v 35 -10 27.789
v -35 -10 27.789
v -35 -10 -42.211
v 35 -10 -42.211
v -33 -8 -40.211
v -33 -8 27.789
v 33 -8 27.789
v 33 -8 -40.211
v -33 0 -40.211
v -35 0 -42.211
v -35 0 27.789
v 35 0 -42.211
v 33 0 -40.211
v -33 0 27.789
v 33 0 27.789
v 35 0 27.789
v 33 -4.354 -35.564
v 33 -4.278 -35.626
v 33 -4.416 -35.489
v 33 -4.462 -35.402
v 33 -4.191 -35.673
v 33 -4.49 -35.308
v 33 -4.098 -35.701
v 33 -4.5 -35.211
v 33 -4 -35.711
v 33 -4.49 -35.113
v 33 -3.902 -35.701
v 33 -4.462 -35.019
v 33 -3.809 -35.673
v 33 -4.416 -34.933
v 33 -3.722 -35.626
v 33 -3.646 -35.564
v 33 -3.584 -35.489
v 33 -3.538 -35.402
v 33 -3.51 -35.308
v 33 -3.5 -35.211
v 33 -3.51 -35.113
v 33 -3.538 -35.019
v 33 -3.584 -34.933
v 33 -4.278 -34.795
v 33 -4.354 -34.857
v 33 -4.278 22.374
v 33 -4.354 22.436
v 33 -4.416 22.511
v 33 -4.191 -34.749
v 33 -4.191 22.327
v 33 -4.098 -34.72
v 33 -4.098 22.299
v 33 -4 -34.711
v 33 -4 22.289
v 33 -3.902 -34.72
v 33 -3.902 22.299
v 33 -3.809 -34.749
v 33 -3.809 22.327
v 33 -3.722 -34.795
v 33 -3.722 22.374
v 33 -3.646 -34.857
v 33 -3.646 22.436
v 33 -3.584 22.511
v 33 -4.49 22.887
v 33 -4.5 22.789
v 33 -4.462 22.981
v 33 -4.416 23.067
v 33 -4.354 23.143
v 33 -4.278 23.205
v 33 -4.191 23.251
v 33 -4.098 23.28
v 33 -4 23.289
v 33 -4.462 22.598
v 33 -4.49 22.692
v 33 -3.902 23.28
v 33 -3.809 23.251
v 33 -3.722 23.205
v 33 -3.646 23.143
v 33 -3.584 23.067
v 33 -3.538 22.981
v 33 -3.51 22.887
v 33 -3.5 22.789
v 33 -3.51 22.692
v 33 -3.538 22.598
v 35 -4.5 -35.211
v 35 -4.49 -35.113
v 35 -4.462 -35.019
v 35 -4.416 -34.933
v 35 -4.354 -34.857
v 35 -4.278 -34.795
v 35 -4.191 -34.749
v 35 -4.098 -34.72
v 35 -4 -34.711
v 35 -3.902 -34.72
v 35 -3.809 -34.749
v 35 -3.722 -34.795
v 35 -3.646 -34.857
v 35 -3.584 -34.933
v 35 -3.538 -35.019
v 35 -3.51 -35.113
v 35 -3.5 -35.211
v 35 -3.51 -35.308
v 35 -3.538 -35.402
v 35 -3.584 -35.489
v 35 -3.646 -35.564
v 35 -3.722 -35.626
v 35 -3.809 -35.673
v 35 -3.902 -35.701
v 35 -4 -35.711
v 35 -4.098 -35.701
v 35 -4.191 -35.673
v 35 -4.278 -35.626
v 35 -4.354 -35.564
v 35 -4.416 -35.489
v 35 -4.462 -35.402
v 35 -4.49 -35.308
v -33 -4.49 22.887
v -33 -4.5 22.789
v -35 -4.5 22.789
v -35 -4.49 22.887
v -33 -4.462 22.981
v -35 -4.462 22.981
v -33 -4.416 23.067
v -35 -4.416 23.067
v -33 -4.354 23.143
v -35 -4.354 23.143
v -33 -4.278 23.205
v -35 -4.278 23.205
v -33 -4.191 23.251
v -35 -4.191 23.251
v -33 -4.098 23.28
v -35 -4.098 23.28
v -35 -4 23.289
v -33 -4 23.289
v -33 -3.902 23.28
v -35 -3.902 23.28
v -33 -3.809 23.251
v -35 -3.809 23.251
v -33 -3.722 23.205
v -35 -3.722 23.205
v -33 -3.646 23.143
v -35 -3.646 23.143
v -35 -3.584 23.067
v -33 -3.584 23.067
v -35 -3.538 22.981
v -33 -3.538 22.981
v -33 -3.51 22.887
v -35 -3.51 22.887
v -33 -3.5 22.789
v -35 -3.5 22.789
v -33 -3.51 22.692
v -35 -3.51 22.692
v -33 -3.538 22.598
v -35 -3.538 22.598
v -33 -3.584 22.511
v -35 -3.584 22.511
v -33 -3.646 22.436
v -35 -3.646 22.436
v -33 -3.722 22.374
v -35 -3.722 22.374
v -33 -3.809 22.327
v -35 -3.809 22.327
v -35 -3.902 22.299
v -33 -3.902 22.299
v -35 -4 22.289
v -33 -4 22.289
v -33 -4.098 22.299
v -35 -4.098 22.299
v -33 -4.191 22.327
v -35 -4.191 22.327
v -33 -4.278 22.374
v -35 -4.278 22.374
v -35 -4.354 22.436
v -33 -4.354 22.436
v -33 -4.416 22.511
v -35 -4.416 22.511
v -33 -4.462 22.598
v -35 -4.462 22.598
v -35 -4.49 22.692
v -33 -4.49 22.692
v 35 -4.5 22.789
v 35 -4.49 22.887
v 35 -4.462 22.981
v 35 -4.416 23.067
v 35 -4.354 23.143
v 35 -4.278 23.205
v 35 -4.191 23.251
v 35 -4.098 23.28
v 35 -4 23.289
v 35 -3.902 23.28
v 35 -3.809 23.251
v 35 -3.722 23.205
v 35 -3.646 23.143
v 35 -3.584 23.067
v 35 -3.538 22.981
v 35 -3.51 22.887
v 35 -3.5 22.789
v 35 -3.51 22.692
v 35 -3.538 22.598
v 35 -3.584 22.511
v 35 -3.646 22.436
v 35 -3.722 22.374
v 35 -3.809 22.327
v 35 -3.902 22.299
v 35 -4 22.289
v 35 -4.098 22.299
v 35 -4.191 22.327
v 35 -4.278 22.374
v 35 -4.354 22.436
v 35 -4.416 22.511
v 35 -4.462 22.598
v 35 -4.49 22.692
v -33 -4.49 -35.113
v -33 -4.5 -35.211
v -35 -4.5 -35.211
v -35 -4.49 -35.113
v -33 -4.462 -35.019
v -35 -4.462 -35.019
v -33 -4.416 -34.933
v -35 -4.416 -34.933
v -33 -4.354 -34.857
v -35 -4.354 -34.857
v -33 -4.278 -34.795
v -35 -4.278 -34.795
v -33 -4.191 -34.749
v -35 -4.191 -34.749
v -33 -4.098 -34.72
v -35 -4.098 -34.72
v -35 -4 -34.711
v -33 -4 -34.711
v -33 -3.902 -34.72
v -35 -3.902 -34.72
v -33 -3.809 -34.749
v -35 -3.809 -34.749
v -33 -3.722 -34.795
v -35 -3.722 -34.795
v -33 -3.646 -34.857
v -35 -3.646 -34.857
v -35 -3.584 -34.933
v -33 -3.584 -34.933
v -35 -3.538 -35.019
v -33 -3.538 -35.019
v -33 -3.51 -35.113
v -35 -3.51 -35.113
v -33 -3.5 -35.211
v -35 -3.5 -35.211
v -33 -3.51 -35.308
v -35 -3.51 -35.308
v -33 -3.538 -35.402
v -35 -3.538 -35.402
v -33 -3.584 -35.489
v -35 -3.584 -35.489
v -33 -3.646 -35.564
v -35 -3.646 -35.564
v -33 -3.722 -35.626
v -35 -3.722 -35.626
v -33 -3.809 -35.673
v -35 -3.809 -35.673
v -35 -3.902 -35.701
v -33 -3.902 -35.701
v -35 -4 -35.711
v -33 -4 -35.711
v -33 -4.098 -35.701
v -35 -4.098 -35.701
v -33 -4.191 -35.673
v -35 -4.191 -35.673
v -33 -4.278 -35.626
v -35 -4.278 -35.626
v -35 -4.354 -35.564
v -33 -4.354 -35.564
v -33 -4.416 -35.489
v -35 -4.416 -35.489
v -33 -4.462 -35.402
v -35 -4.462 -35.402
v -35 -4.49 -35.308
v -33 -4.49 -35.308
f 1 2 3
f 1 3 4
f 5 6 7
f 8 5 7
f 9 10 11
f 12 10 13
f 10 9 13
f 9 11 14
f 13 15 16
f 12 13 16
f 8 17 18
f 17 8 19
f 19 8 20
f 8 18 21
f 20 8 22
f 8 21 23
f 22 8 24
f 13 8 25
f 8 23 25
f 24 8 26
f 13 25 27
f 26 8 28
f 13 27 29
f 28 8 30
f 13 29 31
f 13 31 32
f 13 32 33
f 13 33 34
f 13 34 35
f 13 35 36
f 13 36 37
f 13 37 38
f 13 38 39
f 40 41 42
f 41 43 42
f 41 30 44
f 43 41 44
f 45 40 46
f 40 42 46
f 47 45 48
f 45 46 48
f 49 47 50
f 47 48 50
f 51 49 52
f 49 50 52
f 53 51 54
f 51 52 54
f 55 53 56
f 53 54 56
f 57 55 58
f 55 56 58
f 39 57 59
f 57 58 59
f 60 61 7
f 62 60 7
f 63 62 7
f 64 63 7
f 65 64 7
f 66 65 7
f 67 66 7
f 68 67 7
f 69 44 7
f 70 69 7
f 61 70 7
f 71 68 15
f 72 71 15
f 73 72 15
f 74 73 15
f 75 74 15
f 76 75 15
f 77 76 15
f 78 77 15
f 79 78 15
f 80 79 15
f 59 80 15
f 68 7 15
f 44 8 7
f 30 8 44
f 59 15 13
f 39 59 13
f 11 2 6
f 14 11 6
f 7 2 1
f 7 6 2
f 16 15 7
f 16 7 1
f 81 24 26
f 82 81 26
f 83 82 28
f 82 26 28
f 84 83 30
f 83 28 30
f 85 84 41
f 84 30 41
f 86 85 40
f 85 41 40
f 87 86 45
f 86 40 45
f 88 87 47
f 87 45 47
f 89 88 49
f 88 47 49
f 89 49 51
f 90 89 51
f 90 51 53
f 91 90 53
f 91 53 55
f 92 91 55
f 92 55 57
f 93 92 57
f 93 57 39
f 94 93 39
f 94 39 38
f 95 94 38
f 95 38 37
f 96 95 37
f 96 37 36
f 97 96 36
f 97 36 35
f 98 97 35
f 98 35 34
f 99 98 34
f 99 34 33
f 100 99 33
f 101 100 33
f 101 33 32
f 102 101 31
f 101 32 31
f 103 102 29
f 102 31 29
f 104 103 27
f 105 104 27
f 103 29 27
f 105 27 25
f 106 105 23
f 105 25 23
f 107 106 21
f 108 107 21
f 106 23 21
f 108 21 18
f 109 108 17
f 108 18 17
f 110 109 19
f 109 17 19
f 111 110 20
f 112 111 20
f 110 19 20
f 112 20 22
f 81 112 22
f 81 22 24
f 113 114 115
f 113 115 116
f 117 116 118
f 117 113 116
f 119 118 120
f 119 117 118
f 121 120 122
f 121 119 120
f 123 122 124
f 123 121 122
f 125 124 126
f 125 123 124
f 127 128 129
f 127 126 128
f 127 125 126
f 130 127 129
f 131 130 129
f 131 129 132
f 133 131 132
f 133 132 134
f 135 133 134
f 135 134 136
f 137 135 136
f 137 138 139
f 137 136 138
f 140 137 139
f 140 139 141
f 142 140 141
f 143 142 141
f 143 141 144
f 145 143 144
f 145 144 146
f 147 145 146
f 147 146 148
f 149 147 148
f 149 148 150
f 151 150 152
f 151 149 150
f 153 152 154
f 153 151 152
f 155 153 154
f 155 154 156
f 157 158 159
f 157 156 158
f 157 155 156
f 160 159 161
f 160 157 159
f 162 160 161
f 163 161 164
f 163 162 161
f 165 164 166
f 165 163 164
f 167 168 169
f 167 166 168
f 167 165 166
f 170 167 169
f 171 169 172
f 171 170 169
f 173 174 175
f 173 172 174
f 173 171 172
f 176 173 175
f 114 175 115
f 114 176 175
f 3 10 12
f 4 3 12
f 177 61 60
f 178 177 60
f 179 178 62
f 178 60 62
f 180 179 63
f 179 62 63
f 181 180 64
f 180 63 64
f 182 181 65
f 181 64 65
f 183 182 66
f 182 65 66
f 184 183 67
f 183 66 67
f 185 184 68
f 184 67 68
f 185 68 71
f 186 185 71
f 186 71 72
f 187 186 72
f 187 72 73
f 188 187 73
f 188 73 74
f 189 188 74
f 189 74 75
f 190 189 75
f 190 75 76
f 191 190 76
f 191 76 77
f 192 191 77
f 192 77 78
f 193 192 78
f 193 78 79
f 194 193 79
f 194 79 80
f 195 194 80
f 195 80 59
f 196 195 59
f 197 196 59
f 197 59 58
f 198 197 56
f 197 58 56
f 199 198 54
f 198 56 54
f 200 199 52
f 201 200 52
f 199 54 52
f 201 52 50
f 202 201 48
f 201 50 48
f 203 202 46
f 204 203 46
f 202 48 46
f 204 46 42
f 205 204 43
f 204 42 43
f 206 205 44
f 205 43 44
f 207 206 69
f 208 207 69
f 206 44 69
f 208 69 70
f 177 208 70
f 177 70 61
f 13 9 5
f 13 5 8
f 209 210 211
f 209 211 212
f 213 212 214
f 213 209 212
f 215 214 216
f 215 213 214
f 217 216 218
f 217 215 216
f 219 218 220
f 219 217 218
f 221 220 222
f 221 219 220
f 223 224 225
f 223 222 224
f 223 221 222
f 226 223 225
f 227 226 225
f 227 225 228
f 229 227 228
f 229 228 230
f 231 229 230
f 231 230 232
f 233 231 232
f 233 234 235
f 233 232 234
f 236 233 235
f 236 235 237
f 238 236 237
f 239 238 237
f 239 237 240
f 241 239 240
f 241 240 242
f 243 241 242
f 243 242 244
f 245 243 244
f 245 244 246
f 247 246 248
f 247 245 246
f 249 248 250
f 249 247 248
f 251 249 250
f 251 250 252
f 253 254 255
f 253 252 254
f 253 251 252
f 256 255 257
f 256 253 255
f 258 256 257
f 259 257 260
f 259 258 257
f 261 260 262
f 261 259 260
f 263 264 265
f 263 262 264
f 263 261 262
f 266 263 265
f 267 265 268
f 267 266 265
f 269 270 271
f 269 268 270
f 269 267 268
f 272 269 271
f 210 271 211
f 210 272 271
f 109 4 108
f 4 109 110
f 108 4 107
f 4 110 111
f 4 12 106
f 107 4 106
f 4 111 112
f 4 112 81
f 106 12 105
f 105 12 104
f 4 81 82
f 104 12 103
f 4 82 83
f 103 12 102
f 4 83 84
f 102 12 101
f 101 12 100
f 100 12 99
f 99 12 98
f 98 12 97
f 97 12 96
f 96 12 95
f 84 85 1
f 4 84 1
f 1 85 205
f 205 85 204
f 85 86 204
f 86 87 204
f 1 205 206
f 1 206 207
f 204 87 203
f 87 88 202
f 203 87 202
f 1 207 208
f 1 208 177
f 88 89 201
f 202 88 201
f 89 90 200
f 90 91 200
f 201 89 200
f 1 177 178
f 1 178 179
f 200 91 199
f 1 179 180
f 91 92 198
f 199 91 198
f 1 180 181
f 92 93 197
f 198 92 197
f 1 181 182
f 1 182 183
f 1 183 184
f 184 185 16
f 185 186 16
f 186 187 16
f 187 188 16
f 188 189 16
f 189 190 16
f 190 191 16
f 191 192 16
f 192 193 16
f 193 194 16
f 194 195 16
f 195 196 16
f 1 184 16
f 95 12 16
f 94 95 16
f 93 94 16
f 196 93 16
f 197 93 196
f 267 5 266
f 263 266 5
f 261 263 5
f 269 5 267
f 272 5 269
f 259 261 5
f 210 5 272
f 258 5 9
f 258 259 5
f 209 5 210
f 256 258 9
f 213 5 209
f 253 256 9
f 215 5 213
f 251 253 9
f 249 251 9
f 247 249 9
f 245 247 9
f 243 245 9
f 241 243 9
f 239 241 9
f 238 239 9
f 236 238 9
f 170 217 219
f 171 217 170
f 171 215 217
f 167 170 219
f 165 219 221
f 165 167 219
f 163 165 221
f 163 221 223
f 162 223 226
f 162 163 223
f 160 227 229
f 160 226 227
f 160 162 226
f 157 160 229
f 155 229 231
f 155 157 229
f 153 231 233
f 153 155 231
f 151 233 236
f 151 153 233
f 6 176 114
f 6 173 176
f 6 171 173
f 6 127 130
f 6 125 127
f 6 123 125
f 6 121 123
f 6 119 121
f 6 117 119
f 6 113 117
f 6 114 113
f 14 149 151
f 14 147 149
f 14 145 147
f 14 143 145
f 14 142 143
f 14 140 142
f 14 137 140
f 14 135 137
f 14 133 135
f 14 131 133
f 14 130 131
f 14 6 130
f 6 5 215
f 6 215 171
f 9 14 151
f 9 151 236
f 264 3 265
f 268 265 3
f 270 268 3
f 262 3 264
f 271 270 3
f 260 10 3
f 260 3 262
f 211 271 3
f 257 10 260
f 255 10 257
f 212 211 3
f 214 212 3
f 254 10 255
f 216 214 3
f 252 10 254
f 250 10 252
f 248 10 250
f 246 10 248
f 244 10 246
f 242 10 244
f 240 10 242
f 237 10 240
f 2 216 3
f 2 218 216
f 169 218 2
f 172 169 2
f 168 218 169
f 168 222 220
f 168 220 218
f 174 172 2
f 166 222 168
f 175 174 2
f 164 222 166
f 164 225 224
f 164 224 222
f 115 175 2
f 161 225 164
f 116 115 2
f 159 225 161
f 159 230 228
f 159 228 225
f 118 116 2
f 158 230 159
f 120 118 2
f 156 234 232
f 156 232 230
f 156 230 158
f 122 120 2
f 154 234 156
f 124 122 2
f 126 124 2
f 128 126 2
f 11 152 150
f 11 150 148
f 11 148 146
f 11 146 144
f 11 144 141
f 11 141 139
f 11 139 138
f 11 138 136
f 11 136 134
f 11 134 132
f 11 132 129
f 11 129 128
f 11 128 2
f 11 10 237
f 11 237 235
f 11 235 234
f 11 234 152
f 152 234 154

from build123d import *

# Parameters (mm, degrees)
F0_W          = 70
F0_H          = 70
F1_DEPTH      = 10
F2_T          = -2
F3_W          = 66
F3_H          = 8
F4_DEPTH      = 4.32812
F5_R          = 0.5
F6_DEPTH      = 2.001
F6_DEPTH_BACK = 68.001


with BuildPart() as f1:
    # F0 (on Front) → F1 (new body)
    with BuildSketch(Plane.XZ):
        with Locations((0, -7.2107579758)):
            Rectangle(F0_W, F0_H)
    extrude(amount=F1_DEPTH)

    # F2
    f2_openings = [f1.faces().sort_by_distance(p)[0] for p in [
        (0, 0, -7.210758),
    ]]
    offset(amount=F2_T, openings=f2_openings)

    # F3 (on face) → F4 (cut)
    with BuildSketch(Plane.XY.offset(27.7892420242)):
        with Locations((0, -4)):
            Rectangle(F3_W, F3_H)
    extrude(amount=-F4_DEPTH, mode=Mode.SUBTRACT)

    # F5 (on face) → F6 (cut, two sides)
    with BuildSketch(Plane(origin=(33, 0, 0), x_dir=(0, -1, 0), z_dir=(-1, 0, 0))) as f6_sk:
        with Locations((4, 22.7892420242)):
            Circle(F5_R)
        with Locations((4, -35.2107579758)):
            Circle(F5_R)
    extrude(amount=-F6_DEPTH, mode=Mode.SUBTRACT)
    extrude(f6_sk.sketch, amount=F6_DEPTH_BACK, mode=Mode.SUBTRACT)


solid = f1.part
